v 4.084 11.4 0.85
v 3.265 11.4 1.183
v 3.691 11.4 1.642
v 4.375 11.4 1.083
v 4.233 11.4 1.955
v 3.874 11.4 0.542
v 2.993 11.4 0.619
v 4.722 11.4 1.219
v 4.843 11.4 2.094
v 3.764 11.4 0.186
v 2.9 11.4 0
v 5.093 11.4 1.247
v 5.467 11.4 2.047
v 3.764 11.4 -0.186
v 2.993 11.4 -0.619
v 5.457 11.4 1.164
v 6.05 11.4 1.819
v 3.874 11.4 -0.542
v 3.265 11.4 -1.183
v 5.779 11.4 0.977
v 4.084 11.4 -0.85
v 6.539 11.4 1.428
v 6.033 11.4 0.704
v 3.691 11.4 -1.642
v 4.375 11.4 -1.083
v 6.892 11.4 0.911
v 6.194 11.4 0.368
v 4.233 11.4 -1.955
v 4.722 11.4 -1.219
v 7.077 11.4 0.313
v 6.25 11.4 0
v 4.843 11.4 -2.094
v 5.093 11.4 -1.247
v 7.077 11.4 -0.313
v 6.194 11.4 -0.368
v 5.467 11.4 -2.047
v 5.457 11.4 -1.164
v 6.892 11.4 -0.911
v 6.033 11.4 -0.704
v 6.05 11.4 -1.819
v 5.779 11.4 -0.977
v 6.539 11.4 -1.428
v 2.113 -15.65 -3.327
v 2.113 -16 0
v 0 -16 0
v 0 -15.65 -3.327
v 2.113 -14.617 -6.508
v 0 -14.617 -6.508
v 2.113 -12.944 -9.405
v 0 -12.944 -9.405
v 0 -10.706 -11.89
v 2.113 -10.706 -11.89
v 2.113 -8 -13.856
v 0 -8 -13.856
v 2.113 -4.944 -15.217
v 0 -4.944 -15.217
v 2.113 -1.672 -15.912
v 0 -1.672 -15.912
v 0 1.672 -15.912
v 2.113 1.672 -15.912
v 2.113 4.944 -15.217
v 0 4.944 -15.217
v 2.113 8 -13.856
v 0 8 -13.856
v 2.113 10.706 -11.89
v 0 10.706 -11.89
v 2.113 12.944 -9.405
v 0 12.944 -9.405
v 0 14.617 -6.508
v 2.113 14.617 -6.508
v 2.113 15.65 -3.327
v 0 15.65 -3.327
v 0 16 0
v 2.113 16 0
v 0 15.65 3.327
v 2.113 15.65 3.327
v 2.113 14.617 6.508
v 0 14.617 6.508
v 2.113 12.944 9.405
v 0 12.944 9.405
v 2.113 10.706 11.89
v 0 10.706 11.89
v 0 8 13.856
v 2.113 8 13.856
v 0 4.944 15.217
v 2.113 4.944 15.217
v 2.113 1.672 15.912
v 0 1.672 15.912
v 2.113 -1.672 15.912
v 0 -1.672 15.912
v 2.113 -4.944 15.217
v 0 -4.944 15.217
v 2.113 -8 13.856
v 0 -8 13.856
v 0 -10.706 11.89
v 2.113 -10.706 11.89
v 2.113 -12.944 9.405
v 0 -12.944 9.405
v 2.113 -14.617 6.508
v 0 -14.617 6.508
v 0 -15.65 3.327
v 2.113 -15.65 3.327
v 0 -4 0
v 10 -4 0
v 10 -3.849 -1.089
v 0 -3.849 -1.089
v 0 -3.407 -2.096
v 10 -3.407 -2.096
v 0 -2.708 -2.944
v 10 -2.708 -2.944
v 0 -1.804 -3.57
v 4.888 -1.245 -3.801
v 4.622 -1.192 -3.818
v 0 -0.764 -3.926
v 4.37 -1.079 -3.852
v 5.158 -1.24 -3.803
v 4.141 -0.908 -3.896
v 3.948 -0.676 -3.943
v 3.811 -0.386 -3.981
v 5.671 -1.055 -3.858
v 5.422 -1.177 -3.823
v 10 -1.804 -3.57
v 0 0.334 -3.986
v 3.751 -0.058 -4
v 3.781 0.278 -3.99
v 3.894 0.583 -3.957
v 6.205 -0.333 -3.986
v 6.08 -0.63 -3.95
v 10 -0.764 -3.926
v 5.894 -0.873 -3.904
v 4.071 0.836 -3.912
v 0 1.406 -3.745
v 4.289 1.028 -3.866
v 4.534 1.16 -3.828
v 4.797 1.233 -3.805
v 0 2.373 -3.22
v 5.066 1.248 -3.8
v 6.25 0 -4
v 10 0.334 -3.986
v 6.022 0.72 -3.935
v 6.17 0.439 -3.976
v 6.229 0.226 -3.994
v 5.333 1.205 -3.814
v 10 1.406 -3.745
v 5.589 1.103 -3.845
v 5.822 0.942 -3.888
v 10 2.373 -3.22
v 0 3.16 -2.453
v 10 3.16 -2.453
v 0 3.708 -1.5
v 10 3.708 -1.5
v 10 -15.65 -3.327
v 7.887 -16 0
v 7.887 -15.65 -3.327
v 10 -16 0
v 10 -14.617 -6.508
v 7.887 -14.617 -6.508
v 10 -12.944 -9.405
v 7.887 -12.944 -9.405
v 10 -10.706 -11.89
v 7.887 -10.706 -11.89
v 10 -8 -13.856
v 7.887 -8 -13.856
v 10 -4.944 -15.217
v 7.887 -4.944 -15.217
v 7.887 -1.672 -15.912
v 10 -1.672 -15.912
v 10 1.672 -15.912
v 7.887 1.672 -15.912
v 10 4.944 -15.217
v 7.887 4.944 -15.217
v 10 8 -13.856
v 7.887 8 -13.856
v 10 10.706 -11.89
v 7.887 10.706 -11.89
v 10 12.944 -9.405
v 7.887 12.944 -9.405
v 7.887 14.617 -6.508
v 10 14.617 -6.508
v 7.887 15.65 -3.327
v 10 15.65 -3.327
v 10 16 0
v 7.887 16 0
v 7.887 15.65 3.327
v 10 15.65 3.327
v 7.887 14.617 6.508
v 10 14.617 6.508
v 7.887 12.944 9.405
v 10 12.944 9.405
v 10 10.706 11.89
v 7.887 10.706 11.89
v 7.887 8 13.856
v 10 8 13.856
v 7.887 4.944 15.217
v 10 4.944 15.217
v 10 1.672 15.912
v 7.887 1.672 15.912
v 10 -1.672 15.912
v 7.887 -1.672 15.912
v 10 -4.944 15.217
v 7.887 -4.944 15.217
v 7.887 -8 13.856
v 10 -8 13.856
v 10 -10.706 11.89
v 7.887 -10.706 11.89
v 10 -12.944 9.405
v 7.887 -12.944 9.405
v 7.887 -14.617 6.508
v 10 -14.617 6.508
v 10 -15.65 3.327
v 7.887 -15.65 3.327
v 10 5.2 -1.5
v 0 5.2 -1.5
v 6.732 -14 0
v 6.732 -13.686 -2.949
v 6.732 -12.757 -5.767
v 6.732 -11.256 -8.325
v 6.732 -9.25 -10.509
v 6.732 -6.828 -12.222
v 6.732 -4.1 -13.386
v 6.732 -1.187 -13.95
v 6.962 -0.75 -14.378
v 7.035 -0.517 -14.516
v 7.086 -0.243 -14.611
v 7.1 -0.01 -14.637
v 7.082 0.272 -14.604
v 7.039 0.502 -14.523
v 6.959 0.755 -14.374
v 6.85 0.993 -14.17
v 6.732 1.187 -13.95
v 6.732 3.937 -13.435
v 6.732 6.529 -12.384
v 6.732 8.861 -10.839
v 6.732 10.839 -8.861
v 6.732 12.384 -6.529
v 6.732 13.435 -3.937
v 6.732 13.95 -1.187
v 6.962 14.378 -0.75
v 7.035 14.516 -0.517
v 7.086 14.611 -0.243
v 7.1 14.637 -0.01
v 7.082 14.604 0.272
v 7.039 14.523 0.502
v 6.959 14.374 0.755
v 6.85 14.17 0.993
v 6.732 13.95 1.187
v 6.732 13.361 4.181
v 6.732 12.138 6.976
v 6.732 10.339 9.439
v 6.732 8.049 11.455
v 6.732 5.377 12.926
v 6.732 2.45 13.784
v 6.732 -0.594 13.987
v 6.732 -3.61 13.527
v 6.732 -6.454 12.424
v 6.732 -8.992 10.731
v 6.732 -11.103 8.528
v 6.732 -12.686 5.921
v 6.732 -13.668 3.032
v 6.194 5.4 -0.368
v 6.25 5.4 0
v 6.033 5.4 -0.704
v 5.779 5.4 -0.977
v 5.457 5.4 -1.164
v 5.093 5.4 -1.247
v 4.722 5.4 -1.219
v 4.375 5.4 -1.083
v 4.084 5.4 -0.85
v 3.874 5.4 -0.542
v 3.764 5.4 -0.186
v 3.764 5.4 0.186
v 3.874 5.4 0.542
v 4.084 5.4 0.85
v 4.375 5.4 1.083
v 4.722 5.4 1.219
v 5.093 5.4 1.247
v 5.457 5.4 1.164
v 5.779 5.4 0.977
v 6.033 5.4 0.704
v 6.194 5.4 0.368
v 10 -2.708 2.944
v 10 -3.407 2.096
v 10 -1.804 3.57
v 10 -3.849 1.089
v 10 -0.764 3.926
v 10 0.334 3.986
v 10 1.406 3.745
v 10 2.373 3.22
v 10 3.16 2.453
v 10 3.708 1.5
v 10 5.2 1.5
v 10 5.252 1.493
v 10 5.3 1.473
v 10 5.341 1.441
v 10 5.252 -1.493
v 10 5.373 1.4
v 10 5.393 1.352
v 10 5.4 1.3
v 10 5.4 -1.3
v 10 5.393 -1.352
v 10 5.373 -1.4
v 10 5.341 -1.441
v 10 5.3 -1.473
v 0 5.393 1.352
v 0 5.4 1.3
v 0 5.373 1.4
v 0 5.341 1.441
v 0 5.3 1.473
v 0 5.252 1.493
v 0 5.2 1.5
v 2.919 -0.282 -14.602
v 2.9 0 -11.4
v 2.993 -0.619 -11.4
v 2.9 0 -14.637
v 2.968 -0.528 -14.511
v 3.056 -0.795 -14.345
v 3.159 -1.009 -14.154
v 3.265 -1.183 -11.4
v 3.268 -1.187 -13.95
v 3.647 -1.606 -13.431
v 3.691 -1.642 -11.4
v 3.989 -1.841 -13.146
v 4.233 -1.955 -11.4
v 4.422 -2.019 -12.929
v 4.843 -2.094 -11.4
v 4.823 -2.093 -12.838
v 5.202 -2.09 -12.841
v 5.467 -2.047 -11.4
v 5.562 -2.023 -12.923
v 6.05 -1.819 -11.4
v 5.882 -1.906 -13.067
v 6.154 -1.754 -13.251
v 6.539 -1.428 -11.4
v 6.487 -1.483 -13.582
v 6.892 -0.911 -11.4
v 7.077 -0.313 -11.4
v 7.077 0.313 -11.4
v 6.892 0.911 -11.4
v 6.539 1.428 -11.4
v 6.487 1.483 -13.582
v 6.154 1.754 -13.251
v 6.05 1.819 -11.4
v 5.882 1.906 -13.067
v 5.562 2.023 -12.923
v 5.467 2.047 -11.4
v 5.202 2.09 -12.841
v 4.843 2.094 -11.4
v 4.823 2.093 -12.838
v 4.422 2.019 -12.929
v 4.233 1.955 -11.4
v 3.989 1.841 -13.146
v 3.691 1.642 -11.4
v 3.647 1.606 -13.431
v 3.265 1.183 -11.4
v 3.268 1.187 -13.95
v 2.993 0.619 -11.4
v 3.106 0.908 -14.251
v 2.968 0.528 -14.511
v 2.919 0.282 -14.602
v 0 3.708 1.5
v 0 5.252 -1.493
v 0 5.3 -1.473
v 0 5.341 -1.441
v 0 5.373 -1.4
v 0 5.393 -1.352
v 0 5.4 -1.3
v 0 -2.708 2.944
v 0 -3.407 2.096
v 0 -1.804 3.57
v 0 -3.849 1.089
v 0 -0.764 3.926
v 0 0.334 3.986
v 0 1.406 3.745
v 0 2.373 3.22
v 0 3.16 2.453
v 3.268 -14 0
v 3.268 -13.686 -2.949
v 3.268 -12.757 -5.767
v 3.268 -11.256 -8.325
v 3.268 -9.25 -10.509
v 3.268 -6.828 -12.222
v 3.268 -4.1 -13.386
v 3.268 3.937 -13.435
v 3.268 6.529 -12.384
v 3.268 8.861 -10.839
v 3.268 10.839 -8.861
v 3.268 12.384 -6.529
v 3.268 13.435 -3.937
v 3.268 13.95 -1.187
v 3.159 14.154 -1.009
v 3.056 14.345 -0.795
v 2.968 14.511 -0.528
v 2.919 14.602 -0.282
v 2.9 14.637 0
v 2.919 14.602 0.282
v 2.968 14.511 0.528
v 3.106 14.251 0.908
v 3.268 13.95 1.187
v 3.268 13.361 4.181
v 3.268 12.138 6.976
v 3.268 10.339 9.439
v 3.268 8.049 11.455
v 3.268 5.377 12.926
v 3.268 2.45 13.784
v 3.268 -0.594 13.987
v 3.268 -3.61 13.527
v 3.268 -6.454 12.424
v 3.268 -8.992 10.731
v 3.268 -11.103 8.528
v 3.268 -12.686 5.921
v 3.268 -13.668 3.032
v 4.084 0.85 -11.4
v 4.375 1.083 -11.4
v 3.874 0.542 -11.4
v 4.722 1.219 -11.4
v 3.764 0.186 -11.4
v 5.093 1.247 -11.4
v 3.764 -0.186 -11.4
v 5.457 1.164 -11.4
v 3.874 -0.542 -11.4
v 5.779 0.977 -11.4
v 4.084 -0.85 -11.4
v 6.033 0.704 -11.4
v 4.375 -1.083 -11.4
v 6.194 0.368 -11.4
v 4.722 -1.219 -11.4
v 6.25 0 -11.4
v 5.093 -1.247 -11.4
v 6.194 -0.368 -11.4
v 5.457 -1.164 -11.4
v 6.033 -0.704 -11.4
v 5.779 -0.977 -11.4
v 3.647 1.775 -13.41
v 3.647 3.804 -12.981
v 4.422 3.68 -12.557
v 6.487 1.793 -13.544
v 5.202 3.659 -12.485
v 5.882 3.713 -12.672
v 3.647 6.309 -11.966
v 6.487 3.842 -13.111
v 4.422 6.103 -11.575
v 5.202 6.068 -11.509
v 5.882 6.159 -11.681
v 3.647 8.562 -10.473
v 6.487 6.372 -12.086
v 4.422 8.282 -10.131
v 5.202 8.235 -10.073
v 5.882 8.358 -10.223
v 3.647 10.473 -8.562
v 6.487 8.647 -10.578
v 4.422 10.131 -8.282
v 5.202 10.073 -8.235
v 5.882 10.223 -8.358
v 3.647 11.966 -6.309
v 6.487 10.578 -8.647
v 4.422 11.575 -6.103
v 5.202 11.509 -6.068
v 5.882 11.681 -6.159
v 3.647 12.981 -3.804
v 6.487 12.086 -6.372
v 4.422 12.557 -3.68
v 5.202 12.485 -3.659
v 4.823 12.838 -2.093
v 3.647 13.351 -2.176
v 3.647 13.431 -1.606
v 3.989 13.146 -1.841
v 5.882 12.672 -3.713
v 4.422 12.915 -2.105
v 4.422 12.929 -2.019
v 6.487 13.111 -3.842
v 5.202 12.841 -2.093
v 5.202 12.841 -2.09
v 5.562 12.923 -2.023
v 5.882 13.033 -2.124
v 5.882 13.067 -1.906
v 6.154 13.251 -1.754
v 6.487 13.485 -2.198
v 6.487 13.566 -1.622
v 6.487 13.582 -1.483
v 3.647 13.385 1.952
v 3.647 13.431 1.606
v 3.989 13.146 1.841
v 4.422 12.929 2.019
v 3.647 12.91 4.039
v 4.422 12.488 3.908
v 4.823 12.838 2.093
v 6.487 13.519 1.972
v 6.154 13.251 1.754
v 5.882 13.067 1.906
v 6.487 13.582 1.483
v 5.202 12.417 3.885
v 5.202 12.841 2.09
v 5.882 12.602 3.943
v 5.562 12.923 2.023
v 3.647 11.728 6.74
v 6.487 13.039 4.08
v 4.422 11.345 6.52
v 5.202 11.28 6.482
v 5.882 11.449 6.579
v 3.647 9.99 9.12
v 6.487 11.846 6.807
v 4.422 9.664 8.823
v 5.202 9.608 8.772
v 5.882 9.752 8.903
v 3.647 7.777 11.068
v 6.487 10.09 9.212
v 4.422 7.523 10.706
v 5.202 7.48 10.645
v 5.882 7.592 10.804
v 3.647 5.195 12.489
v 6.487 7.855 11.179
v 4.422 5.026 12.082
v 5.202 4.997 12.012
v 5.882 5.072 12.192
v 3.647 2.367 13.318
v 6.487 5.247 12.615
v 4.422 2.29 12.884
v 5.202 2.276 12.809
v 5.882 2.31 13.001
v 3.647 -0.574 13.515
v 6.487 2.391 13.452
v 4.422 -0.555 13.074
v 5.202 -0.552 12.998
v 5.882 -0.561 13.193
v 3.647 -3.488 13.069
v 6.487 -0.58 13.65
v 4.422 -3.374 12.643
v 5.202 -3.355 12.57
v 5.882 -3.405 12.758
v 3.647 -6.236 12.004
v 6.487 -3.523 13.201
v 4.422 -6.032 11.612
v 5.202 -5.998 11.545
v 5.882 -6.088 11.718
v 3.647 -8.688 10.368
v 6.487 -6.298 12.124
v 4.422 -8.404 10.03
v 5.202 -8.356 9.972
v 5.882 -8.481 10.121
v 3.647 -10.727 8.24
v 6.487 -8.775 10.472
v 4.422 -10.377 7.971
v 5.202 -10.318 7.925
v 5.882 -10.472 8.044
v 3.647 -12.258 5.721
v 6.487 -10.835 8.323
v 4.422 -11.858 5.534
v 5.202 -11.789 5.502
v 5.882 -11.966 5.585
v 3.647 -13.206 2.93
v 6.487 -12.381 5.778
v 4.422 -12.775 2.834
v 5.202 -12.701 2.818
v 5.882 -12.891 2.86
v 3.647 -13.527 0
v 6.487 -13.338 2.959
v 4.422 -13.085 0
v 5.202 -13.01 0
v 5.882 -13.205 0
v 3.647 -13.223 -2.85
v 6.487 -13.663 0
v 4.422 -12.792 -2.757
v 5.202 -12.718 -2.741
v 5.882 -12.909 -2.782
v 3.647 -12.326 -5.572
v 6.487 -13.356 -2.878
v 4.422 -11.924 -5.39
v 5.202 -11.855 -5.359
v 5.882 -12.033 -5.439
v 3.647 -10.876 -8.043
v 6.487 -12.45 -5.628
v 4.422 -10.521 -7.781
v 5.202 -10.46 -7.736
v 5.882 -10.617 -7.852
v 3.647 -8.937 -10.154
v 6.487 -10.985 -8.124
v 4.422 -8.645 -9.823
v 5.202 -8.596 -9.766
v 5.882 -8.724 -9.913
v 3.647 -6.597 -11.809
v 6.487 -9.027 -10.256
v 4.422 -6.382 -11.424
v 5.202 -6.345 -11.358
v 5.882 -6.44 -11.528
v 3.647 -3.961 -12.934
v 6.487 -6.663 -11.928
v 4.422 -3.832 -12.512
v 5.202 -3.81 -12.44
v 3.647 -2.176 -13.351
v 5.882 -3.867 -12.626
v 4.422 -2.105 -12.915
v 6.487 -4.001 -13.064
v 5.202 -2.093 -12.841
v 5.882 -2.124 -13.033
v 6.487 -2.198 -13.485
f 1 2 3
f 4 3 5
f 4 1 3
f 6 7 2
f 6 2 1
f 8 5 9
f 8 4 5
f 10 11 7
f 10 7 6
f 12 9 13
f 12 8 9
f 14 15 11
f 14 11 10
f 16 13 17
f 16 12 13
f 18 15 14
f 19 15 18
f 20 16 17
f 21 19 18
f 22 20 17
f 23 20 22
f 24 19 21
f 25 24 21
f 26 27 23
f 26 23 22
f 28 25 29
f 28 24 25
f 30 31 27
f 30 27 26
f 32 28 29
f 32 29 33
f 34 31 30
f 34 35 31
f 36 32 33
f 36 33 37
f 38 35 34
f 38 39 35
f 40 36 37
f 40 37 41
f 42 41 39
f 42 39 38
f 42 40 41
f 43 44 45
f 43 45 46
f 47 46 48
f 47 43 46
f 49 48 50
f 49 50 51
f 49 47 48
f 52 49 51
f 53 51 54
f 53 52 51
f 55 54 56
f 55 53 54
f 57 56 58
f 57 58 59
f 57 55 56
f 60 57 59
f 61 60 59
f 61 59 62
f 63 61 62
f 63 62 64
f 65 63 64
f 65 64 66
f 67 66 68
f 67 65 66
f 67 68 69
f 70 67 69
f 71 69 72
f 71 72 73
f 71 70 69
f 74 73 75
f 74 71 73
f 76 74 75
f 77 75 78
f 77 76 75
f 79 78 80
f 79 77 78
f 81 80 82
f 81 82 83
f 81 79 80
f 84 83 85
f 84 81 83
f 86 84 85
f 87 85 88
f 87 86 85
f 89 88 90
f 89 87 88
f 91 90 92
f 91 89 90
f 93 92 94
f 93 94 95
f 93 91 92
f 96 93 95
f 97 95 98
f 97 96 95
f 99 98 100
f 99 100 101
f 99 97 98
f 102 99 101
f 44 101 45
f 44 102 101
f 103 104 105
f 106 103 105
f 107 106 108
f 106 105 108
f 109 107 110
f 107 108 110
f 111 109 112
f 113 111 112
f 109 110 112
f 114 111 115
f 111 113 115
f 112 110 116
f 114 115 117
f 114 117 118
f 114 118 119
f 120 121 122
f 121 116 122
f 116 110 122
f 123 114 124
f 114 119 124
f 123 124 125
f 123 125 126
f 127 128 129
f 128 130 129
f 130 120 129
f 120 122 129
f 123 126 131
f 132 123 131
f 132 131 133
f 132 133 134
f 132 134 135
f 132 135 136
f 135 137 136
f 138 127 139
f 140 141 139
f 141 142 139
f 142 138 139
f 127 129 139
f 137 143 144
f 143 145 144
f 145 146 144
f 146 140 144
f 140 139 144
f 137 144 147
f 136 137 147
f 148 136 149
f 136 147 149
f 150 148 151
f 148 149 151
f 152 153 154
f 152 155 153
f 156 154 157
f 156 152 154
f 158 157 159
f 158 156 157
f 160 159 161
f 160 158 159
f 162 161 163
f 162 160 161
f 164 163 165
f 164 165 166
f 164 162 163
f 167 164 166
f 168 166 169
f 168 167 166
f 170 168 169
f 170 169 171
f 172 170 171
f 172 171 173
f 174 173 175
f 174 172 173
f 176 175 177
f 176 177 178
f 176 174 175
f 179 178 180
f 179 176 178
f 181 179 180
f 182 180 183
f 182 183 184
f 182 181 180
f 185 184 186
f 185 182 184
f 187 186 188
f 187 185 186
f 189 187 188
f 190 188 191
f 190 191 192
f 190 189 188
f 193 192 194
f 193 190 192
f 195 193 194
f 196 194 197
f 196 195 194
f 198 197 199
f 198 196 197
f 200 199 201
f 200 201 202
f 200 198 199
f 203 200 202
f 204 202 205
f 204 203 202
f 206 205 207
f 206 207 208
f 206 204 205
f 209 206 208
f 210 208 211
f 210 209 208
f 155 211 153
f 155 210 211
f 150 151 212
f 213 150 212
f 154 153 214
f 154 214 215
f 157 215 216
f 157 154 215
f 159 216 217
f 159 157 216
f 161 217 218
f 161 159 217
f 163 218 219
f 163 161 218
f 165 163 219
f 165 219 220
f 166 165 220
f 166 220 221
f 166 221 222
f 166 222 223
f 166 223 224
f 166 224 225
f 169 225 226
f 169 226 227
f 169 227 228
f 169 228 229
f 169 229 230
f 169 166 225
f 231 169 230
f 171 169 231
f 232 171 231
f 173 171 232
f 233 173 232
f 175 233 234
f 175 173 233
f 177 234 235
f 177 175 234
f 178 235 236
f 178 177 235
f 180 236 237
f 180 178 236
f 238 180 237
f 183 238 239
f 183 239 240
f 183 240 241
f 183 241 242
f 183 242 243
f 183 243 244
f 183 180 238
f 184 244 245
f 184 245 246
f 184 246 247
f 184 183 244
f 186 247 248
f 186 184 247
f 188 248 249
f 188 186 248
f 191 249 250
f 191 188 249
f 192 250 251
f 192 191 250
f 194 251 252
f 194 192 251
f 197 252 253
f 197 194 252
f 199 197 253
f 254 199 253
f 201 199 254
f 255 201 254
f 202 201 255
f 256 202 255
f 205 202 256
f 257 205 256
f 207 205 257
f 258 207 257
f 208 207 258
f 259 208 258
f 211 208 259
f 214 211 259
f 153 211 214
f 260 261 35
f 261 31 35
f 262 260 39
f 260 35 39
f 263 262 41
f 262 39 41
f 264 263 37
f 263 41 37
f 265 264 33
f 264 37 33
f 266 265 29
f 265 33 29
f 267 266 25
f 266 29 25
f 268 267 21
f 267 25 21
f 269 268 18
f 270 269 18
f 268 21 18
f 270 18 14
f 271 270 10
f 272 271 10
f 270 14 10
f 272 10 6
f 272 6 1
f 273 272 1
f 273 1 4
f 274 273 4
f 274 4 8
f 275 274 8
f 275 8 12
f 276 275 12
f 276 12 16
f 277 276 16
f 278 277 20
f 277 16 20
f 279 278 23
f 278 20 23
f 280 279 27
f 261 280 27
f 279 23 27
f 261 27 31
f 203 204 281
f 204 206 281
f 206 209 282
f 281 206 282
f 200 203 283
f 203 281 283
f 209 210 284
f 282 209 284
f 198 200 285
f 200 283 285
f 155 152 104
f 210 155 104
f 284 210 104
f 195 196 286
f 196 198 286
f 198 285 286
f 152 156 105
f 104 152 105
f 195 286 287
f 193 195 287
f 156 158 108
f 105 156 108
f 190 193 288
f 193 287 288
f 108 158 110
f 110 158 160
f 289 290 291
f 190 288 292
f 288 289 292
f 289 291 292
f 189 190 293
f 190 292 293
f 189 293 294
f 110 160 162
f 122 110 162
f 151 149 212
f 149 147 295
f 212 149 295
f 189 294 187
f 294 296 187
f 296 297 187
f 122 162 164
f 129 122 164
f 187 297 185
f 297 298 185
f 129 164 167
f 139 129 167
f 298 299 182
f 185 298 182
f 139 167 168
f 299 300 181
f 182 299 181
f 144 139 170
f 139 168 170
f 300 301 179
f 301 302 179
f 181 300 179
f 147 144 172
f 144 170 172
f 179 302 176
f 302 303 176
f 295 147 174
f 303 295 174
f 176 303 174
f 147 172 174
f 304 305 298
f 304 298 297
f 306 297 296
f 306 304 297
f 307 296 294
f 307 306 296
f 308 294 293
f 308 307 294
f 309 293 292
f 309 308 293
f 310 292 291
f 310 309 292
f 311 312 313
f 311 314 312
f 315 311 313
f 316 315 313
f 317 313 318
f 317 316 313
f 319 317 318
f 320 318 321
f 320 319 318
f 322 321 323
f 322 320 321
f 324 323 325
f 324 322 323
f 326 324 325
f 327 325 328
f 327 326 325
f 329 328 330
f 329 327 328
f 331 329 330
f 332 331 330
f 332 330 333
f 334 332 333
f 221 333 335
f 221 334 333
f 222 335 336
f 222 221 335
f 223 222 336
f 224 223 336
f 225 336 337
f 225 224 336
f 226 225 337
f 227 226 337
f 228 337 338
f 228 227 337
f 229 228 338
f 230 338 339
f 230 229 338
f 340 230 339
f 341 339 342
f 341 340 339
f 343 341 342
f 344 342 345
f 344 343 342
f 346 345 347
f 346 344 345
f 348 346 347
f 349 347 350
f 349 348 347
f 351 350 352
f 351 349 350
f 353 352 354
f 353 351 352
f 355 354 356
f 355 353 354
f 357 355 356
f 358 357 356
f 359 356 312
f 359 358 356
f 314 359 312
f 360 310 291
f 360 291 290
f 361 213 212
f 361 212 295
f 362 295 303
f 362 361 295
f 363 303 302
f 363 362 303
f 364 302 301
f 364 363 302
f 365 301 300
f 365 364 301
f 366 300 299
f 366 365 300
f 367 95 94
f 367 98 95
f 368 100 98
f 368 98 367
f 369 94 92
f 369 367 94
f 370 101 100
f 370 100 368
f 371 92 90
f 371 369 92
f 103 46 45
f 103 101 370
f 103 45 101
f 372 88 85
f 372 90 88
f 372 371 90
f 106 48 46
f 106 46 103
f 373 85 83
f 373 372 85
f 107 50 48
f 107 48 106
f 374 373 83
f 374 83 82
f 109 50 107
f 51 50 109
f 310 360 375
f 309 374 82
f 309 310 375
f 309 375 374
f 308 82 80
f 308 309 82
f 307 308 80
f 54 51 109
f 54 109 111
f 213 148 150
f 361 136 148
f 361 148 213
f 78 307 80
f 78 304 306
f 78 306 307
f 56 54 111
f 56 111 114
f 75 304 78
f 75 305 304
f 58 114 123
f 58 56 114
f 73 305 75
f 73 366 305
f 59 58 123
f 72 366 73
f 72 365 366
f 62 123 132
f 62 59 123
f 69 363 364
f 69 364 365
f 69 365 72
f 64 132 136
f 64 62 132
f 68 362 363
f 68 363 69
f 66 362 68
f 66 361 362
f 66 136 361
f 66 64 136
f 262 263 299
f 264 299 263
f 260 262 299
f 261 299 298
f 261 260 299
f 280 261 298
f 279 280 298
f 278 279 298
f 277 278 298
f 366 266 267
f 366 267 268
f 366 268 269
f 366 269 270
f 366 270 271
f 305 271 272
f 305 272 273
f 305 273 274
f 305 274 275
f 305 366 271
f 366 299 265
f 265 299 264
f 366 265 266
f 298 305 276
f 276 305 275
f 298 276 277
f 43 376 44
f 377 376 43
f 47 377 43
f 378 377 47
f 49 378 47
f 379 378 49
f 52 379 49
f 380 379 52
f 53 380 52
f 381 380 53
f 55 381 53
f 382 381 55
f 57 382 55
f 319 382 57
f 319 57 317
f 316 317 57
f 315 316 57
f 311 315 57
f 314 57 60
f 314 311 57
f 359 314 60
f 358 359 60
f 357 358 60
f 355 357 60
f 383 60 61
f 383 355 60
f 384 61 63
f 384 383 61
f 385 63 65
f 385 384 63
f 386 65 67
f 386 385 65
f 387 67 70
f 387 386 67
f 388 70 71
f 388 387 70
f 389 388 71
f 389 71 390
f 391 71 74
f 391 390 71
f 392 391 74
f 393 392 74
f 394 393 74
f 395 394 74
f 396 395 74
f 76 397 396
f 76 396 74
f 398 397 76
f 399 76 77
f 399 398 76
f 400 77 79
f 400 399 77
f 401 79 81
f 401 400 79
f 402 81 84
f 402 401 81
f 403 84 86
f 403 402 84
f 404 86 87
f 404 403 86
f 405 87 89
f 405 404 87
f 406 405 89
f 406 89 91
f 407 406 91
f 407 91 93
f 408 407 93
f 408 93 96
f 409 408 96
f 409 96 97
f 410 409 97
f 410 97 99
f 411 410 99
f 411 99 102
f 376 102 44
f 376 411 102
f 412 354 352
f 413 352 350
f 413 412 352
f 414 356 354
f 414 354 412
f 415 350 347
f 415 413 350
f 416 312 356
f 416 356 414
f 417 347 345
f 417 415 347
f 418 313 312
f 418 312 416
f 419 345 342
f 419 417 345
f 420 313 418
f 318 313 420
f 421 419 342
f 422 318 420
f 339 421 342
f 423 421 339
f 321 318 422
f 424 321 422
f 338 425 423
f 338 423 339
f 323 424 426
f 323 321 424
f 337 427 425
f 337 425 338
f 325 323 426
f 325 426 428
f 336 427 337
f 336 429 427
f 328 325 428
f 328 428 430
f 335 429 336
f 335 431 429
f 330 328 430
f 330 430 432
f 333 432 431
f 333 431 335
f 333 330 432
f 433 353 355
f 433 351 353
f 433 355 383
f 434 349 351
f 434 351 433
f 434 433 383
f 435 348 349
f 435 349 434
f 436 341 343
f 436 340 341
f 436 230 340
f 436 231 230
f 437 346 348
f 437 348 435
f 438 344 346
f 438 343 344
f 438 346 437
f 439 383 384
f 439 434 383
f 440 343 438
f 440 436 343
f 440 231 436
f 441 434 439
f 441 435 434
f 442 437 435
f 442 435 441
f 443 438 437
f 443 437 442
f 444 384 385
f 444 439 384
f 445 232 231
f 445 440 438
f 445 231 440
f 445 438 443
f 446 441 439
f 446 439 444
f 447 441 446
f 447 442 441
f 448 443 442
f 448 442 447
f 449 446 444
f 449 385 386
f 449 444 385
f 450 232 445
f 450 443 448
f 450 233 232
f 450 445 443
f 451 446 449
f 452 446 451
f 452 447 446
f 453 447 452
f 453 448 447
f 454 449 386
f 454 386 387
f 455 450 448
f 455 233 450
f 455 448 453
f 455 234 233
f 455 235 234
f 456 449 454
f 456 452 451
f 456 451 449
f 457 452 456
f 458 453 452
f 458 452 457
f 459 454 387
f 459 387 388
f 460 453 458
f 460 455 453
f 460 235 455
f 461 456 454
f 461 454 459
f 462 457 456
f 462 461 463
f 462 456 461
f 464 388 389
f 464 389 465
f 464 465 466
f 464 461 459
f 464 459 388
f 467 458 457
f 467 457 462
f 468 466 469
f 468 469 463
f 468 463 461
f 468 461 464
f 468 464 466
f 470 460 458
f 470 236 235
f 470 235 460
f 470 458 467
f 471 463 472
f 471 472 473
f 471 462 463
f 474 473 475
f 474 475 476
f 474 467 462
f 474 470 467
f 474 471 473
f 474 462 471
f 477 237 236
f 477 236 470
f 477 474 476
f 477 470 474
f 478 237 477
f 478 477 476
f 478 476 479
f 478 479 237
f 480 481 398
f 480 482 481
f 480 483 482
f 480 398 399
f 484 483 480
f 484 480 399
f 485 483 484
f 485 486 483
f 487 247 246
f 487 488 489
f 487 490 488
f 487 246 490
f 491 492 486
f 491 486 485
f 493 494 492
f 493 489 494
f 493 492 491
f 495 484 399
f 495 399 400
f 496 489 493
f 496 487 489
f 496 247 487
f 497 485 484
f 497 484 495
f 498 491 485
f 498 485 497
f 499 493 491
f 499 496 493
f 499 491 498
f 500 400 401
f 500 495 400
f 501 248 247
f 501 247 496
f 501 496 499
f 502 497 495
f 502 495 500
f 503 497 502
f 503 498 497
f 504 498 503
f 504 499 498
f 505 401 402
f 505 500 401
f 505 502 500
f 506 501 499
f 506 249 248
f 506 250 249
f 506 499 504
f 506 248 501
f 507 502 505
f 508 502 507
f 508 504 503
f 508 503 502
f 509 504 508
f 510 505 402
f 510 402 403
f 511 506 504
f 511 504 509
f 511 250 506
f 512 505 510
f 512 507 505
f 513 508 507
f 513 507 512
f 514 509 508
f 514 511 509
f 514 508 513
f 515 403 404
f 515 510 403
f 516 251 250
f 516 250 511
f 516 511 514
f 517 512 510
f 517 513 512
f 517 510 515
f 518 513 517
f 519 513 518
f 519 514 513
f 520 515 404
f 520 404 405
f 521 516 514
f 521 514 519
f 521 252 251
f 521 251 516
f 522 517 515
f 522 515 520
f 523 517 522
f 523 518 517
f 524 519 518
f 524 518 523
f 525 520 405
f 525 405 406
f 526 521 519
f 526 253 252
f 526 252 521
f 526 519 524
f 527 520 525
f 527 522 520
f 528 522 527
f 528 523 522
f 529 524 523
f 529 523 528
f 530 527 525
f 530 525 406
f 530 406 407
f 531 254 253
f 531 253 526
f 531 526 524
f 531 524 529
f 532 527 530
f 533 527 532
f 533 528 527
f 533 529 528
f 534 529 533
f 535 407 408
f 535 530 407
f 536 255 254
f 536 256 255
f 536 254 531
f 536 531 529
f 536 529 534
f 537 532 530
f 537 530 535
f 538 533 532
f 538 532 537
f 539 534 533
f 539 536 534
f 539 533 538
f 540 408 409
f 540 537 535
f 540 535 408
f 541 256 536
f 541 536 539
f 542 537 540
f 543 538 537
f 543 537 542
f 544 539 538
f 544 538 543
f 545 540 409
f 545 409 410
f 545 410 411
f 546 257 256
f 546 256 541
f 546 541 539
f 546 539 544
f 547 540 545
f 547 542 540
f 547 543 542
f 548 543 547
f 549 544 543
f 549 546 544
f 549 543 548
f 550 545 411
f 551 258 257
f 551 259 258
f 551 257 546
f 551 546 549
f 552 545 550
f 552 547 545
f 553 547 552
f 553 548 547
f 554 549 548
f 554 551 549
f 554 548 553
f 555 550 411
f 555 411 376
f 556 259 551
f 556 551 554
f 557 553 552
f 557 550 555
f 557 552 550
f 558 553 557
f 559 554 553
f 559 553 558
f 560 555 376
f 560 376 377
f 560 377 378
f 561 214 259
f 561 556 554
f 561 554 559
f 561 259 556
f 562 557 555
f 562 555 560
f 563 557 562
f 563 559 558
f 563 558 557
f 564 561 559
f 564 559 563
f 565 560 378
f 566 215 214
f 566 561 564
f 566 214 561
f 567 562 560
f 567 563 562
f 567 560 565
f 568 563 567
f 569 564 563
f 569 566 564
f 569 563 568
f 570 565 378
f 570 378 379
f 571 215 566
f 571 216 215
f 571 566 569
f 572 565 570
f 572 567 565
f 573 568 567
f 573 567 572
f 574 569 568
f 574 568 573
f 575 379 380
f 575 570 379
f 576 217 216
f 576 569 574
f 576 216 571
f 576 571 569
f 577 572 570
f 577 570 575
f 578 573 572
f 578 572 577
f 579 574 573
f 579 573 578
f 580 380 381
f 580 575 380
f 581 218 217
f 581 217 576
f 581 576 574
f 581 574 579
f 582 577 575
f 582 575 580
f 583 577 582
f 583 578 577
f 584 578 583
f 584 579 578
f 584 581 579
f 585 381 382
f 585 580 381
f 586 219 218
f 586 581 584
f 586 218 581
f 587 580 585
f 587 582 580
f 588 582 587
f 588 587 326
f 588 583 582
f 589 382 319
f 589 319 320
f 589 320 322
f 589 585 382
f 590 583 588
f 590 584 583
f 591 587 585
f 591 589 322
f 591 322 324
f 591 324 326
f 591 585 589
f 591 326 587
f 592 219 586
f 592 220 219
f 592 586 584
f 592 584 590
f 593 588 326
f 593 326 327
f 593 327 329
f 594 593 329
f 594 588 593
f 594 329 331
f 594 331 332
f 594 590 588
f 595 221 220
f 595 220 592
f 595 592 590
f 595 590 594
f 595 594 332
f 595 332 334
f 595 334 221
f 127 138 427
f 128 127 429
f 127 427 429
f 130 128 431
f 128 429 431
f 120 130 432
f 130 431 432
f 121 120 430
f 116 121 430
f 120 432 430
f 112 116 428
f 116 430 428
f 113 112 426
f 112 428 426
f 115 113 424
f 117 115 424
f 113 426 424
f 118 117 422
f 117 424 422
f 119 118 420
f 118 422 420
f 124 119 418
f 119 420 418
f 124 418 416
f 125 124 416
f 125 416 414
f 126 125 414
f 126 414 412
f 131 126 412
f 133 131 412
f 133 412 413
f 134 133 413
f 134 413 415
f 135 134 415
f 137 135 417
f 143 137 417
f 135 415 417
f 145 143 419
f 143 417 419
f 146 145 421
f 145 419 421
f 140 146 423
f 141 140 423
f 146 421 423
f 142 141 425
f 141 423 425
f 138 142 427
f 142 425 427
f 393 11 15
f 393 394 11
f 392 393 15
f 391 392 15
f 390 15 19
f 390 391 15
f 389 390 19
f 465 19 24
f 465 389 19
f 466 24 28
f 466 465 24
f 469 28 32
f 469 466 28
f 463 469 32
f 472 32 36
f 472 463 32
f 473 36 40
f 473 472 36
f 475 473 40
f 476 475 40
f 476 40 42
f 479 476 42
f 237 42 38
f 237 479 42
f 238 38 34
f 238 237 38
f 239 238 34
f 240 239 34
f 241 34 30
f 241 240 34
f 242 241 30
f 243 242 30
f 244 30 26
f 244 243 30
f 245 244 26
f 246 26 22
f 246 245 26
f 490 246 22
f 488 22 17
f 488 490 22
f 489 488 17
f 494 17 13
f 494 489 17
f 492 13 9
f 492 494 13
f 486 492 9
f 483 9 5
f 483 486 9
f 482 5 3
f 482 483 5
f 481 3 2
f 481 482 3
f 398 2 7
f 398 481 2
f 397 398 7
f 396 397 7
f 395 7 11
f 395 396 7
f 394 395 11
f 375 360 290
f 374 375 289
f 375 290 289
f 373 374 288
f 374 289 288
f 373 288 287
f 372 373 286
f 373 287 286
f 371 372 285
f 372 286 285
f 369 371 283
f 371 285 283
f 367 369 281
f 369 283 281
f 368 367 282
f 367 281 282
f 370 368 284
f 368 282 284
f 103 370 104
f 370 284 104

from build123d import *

# Parameters (mm, degrees)
SKETCH1_W           = 10
SKETCH1_H           = 12
SKETCH2_W           = 2.1
SKETCH2_H           = 4.6
TAPPED_HOLE1_REACH  = 38.29
TAPPED_HOLE1_BORE_R = 1.25
CIRPATTERN1_COUNT   = 2
CIRPATTERN1_ANGLE   = 90
CUT_EXTRUDE1_DEPTH  = 25.738633924


with BuildPart() as part:
    # Sketch1 → Revolve1 (revolve)
    with BuildSketch(Plane.XY, mode=Mode.PRIVATE) as revolve1_sk:
        with Locations((5, 10)):
            Rectangle(SKETCH1_W, SKETCH1_H)
    revolve(revolve1_sk.sketch.rotate(Axis((0, 0, 0), (1, 0, 0)), 180), axis=Axis((0, 0, 0), (1, 0, 0)))

    # Sketch2 → Cut-Revolve1 (revolve, cut)
    with BuildSketch(Plane.XY, mode=Mode.PRIVATE) as cut_revolve1_sk:
        with Locations((6.05, 13.7)):
            Rectangle(SKETCH2_W, SKETCH2_H)
    cut_revolve1 = revolve(cut_revolve1_sk.sketch.rotate(Axis((5, 16, 0), (0, -1, 0)), 180), axis=Axis((5, 16, 0), (0, -1, 0)), mode=Mode.SUBTRACT)

    # Tapped Hole1 bore → Tapped Hole1 (cut, up to next)
    with BuildSketch(Plane(origin=(0, 15, 0), x_dir=(1, 0, 0), z_dir=(0, 1, 0)), mode=Mode.PRIVATE) as tapped_hole1_sk1:
        with Locations((5, 0)):
            Circle(TAPPED_HOLE1_BORE_R)
    tapped_hole1_tool1 = extrude(tapped_hole1_sk1.sketch, amount=-TAPPED_HOLE1_REACH, mode=Mode.PRIVATE) & part.part
    tapped_hole1 = tapped_hole1_tool1.solids().sort_by_distance((5, 15, 0))[0]
    add(tapped_hole1, mode=Mode.SUBTRACT)

    # CirPattern1: Cut-Revolve1, Tapped Hole1 ×2 about axis
    cirpattern1_axis = Axis((0, 0, 0), (-1, 0, 0))
    add([cut_revolve1.rotate(cirpattern1_axis, i * CIRPATTERN1_ANGLE / (CIRPATTERN1_COUNT - 1)) for i in range(1, CIRPATTERN1_COUNT)], mode=Mode.SUBTRACT)
    add([tapped_hole1.rotate(cirpattern1_axis, i * CIRPATTERN1_ANGLE / (CIRPATTERN1_COUNT - 1)) for i in range(1, CIRPATTERN1_COUNT)], mode=Mode.SUBTRACT)

    # Sketch5 → Cut-Extrude1 (cut, through all)
    with BuildSketch(Plane(origin=(0, 0, 0), x_dir=(0, 0, -1), z_dir=(1, 0, 0))):
        with BuildLine():
            Line((-1.5, 0), (1.5, 0))
            Line((1.5, 0), (1.5, 5.2))
            ThreePointArc((1.5, 5.2), (1.441421356, 5.341421356), (1.3, 5.4))
            Line((1.3, 5.4), (-1.3, 5.4))
            ThreePointArc((-1.3, 5.4), (-1.441421356, 5.341421356), (-1.5, 5.2))
            Line((-1.5, 5.2), (-1.5, 0))
        make_face()
    extrude(amount=CUT_EXTRUDE1_DEPTH, mode=Mode.SUBTRACT)

    # Sketch7 → Cut-Revolve3 (revolve, cut)
    with BuildSketch(Plane.XY, mode=Mode.PRIVATE) as cut_revolve3_sk:
        with BuildLine():
            Line((2.113248654, 16), (3.267949192, 14))
            ThreePointArc((3.267949192, 14), (5, 13), (6.732050808, 14))
            Line((6.732050808, 14), (7.886751346, 16))
            Line((7.886751346, 16), (2.113248654, 16))
        make_face()
    revolve(cut_revolve3_sk.sketch.rotate(Axis((0, 0, 0), (1, 0, 0)), 180), axis=Axis((0, 0, 0), (1, 0, 0)), mode=Mode.SUBTRACT)


solid = part.part
